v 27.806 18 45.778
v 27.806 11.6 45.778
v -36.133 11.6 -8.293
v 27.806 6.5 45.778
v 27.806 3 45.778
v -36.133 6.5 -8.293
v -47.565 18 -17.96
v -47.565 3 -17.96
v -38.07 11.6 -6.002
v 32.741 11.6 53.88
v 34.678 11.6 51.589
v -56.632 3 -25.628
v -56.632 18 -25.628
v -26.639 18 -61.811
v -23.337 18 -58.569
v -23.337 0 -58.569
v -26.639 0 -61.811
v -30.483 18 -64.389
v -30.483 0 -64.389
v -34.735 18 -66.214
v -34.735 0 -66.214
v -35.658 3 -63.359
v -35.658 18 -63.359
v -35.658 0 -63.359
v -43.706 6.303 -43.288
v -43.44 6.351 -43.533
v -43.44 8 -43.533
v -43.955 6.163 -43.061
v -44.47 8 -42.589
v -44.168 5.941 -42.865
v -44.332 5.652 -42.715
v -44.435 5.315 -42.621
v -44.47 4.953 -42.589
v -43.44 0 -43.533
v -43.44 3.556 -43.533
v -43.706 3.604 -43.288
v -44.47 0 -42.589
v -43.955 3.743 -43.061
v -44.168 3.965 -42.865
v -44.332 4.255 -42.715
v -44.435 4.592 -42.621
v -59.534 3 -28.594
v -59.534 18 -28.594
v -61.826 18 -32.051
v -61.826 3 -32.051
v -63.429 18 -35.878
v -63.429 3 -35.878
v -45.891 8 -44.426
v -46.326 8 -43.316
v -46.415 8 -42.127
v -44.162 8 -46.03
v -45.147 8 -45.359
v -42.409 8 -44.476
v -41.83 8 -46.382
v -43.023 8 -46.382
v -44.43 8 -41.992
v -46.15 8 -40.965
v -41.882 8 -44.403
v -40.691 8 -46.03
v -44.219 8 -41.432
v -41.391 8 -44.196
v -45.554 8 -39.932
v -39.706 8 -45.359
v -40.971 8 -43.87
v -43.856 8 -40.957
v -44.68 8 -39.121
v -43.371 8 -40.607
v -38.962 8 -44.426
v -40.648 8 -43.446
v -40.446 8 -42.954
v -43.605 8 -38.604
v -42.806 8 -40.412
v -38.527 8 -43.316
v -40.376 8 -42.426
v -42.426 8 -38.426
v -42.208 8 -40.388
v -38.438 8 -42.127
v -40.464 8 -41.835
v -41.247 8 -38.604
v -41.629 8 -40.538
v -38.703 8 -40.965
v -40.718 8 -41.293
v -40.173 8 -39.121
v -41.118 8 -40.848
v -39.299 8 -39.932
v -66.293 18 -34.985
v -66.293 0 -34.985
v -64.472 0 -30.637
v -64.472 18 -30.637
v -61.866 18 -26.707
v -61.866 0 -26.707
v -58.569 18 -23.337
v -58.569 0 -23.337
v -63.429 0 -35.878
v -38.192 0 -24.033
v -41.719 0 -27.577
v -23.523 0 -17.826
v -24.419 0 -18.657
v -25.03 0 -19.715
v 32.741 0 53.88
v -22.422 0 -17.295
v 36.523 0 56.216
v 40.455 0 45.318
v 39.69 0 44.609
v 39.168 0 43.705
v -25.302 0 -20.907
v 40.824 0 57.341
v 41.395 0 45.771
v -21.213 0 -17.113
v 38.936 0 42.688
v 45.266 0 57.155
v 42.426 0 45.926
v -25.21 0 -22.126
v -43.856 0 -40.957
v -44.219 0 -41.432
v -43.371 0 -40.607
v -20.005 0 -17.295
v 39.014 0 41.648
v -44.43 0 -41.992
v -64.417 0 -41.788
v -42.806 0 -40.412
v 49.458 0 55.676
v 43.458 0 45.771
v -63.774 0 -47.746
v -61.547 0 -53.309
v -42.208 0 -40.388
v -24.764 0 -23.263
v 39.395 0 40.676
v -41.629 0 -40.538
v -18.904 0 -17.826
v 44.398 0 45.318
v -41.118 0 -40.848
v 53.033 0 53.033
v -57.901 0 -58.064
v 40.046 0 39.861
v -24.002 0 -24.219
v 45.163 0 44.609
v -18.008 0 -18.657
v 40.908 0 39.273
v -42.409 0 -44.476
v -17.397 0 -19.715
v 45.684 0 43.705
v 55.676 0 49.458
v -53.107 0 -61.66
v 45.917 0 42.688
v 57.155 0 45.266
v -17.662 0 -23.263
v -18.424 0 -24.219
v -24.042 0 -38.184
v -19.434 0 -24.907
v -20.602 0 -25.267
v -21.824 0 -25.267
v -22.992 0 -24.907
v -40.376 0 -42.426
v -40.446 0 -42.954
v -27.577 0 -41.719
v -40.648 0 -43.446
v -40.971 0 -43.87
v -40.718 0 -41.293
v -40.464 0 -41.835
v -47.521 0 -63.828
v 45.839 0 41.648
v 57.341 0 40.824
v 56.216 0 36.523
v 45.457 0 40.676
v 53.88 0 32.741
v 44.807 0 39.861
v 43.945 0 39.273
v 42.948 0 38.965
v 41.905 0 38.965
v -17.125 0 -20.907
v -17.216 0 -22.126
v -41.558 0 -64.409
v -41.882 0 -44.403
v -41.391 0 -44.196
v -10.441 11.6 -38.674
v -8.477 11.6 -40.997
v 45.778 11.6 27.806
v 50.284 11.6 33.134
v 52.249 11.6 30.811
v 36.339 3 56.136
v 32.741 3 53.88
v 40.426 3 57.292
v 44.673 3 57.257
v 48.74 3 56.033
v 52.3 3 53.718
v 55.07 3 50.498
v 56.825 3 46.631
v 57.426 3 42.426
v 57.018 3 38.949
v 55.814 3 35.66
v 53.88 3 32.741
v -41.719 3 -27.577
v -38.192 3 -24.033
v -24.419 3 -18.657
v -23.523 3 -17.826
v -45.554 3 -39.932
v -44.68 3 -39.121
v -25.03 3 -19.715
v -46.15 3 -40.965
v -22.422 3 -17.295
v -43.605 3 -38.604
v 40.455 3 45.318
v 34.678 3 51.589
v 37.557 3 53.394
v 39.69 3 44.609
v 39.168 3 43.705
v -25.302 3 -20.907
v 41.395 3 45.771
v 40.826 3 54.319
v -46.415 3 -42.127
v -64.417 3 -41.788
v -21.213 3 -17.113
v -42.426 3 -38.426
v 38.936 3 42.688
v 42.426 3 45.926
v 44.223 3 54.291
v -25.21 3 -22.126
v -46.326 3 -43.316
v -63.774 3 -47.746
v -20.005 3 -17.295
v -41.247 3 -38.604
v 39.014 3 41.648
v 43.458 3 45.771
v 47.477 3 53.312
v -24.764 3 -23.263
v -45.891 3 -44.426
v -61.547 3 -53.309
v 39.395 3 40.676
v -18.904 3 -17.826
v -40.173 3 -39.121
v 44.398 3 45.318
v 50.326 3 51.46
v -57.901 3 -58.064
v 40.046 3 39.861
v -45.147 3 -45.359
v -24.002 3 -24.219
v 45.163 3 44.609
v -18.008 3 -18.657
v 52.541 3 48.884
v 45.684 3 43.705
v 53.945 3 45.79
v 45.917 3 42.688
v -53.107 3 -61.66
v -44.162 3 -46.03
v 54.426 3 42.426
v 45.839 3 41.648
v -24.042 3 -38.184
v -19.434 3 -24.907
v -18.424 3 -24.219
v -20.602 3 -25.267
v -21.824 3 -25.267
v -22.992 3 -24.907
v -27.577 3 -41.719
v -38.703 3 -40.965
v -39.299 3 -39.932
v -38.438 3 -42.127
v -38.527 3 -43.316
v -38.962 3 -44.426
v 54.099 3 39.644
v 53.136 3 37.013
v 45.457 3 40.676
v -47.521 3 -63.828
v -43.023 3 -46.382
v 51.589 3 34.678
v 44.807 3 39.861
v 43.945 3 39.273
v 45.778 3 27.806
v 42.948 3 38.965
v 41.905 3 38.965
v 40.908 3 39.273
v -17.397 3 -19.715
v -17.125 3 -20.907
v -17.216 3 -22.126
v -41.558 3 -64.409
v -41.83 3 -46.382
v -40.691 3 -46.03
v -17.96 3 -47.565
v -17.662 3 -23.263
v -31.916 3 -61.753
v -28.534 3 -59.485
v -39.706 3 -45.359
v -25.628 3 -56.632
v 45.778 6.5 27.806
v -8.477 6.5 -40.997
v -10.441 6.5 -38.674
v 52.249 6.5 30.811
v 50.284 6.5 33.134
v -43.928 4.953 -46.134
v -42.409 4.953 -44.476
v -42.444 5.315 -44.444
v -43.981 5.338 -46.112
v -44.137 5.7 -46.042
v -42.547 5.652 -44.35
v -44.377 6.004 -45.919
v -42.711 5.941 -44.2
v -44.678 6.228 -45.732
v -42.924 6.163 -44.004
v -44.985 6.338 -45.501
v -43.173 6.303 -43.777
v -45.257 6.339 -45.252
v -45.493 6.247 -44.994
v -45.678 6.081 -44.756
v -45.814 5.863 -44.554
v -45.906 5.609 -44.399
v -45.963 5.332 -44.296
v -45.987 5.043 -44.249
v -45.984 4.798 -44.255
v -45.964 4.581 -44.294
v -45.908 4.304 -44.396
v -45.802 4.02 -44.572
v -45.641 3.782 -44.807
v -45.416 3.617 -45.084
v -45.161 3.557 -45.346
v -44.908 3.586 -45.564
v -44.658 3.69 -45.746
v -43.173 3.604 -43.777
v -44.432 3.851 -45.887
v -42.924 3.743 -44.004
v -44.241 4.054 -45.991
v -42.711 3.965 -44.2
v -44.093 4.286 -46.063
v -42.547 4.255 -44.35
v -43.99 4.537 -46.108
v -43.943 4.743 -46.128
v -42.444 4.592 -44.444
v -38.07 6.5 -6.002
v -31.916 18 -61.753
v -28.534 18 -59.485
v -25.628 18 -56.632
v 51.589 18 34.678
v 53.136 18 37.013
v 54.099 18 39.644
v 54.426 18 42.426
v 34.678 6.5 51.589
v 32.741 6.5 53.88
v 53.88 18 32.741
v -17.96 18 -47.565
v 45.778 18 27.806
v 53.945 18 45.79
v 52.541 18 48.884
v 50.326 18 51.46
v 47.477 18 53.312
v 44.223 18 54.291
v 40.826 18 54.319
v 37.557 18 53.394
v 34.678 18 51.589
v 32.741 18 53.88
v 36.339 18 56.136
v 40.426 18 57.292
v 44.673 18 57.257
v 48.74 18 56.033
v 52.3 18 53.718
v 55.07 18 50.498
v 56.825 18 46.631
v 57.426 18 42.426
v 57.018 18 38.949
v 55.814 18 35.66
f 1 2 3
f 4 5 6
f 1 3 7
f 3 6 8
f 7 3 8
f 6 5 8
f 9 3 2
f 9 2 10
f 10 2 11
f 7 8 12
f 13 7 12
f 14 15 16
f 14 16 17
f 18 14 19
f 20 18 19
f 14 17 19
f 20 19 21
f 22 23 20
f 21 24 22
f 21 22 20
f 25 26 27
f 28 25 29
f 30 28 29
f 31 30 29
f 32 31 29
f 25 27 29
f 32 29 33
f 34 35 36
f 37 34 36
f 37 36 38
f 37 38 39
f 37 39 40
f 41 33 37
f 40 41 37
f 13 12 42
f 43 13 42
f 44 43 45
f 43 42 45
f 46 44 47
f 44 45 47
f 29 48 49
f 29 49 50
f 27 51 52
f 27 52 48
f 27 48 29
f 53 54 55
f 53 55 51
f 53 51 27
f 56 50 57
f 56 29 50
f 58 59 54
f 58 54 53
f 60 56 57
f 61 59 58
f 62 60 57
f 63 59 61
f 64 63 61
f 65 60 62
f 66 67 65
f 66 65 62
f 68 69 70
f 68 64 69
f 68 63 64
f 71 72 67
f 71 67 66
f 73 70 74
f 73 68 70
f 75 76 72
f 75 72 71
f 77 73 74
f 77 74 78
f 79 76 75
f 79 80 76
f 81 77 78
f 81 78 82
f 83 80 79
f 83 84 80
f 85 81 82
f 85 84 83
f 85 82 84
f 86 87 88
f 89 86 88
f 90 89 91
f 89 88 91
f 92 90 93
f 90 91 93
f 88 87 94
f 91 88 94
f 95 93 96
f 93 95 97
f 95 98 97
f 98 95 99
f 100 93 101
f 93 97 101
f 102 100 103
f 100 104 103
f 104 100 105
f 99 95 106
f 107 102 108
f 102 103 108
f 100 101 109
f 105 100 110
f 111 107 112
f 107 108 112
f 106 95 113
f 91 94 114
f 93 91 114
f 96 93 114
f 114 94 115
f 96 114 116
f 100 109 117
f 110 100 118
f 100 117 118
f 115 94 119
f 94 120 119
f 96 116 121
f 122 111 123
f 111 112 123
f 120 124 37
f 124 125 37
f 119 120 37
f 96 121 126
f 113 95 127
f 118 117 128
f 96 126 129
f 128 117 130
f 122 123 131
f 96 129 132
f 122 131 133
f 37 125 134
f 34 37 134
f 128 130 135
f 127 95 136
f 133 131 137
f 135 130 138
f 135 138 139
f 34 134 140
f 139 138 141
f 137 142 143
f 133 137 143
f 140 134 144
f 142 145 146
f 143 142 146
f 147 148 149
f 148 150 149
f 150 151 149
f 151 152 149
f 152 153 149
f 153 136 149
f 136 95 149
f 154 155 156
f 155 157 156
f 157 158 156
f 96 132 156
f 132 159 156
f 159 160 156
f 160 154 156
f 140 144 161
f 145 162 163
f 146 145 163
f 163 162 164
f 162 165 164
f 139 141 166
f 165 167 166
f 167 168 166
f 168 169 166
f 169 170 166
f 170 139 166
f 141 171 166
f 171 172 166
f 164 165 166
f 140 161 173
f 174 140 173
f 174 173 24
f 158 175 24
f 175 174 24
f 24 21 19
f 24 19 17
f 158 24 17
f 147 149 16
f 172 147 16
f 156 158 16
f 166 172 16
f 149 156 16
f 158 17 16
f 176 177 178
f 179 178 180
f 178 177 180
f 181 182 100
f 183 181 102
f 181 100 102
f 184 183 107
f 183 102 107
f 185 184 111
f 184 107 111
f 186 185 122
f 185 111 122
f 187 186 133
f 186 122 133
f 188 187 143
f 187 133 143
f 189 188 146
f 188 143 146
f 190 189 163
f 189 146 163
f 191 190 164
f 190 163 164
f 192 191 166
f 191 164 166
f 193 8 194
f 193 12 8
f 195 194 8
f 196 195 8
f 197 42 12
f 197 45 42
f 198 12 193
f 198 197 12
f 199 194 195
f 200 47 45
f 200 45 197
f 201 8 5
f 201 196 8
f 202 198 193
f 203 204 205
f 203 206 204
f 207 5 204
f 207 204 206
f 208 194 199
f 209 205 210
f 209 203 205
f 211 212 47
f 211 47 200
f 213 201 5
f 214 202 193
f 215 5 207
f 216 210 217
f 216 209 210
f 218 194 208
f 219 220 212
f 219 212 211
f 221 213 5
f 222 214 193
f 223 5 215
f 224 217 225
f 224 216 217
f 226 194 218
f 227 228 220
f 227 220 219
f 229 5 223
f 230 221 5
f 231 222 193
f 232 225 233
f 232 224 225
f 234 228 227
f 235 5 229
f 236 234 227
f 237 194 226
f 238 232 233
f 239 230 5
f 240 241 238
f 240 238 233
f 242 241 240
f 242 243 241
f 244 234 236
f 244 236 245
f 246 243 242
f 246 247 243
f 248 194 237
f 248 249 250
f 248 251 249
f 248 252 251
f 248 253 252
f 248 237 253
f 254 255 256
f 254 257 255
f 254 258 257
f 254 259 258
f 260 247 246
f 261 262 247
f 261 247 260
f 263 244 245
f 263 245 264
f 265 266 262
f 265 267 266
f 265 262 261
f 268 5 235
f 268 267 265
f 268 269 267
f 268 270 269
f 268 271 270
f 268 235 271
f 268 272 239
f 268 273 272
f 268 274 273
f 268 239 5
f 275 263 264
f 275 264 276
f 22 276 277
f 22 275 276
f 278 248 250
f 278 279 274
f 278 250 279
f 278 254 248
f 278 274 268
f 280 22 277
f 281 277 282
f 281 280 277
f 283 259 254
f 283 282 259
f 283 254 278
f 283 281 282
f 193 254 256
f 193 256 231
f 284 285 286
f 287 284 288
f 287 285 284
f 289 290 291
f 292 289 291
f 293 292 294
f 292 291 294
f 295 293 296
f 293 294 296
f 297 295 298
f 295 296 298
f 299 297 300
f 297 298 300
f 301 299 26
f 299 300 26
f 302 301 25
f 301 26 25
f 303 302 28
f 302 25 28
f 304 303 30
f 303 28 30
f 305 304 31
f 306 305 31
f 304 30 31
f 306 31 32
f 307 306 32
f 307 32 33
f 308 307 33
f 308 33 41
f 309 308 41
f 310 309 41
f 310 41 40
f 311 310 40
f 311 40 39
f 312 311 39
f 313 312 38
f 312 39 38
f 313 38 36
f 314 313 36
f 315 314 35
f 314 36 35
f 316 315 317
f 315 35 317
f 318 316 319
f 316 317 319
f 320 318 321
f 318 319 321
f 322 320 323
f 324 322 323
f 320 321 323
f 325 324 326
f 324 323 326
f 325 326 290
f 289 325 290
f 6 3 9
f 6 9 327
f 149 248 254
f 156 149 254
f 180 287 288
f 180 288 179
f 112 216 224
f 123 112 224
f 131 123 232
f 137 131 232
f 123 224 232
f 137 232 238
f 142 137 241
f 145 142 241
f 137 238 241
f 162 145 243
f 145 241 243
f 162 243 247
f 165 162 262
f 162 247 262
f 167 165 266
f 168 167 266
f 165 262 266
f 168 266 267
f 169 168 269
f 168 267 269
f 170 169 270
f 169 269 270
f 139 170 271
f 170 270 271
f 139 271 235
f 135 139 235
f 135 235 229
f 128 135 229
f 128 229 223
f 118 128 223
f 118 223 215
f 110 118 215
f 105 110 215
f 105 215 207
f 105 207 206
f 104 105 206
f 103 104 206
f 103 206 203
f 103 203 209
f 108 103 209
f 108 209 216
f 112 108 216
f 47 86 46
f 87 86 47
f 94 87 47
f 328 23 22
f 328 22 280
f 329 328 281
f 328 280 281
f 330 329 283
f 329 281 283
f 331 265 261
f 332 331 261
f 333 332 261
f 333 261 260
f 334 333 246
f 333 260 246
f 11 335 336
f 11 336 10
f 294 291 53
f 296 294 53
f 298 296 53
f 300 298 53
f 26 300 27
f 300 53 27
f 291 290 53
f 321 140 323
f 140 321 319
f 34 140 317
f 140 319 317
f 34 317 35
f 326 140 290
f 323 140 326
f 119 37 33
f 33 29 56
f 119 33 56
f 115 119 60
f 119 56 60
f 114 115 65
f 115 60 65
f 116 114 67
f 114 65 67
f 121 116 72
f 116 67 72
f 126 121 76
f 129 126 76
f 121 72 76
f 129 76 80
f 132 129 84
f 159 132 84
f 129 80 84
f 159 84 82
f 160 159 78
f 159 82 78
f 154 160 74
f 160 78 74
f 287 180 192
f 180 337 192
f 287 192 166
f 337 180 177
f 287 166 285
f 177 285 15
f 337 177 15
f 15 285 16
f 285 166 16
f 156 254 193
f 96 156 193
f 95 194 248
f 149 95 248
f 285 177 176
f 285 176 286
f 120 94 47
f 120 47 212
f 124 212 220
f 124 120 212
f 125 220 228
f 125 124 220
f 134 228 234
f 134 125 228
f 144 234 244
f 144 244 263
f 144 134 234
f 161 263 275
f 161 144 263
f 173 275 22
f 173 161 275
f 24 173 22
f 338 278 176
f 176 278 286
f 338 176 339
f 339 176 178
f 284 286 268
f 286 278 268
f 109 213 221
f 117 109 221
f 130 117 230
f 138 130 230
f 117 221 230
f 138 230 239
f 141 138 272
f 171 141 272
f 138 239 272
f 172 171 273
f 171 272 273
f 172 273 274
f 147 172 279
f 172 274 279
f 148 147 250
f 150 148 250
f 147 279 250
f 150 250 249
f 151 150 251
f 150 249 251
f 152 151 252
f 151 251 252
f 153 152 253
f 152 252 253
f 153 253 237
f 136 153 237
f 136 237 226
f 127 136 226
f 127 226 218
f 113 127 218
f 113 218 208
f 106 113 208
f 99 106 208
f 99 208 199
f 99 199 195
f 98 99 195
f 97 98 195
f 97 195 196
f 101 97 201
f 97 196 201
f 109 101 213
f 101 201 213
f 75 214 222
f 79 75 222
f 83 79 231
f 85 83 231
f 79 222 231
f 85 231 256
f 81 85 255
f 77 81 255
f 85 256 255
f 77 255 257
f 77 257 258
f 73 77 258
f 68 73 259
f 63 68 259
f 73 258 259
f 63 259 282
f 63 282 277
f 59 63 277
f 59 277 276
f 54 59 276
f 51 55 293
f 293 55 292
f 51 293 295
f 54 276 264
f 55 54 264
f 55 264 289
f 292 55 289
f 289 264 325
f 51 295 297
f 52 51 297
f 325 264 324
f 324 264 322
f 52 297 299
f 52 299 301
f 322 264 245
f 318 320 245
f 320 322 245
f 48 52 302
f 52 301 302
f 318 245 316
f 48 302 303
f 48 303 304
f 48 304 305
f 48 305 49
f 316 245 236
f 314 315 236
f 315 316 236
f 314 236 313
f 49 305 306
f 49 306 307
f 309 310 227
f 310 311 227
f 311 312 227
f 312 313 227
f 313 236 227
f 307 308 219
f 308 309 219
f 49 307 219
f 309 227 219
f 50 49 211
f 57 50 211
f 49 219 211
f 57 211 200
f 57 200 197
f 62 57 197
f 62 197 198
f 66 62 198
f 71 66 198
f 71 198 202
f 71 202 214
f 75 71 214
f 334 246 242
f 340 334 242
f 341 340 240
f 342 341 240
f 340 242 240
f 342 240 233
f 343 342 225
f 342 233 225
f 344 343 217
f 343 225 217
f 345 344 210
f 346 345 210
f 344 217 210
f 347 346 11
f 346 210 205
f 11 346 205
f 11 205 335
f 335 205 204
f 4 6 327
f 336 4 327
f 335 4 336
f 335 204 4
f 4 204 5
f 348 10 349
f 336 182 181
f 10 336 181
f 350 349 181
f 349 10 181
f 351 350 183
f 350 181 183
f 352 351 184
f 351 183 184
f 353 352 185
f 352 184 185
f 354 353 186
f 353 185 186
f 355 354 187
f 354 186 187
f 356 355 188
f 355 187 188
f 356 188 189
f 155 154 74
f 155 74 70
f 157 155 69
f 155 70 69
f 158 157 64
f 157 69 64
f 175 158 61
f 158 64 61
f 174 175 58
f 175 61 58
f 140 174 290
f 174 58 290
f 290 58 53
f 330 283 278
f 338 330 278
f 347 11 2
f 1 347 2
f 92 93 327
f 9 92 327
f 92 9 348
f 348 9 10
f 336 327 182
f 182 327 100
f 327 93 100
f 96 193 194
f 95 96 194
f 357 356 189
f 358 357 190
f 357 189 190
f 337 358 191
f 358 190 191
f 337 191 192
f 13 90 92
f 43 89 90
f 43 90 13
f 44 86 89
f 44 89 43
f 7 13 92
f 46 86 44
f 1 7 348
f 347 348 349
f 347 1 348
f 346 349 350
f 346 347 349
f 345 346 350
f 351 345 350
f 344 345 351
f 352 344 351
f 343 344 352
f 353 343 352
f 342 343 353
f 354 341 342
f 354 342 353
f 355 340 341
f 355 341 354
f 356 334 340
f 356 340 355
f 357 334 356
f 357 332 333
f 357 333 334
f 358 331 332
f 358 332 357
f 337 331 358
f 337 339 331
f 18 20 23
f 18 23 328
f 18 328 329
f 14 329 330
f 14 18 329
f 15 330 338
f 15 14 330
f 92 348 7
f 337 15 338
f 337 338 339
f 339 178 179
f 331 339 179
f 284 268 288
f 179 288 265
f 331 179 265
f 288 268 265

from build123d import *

# Parameters (mm, degrees)
EXTRUDE_2_DEPTH           = 3
SKETCH_4_R                = 2.25
SKETCH_4_R_2              = 2.5
CUT_EXTRUDE_2_DEPTH       = 96.402519291
SKETCH_6_R                = 3.5
CUT_EXTRUDE_3_DEPTH       = 96.402519291
SKETCH_7_R                = 3.5
CUT_EXTRUDE_4_DEPTH       = 96.402519291
CUT_EXTRUDE_5_DEPTH       = 96.402519291
EXTRUDE_4_DEPTH           = 15
EXTRUDE_5_DEPTH           = 3
SKETCH_11_R               = 4.1
CUT_EXTRUDE_6_DEPTH       = 3
SKETCH_13_R               = 3.5
EXTRUDE_6_DEPTH           = 3
SKETCH_14_R               = 2.05
EXTRUDE_7_DEPTH           = 5
EXTRUDE_START             = -5
SKETCH_15_R               = 4
SKETCH_15_R_2             = 2.05
EXTRUDE_8_DEPTH           = 5
CUT_EXTRUDE_7_DEPTH       = 96.878259721
SKETCH_18_R               = 1.397318861
CUT_EXTRUDE_8_DEPTH       = 144.753442506
CUT_EXTRUDE_9_DEPTH       = 97.527927136
CUT_EXTRUDE_9_DEPTH_BACK  = 97.527927136
CUT_EXTRUDE_11_DEPTH      = 110.140706759
CUT_EXTRUDE_11_DEPTH_BACK = 110.140706759
SKETCH_20_W               = 92.736362136
SKETCH_20_H               = 2.6
SKETCH_20_H_2             = 2.5
CUT_EXTRUDE_12_DEPTH      = 5


with BuildPart() as part:
    # 草图2 → 凸台-拉伸2 (new body)
    with BuildSketch(Plane(origin=(0, 0, 0), x_dir=(1, 0, 0), z_dir=(0, 1, 0))):
        with BuildLine():
            Line((-58.569449541, 23.337085947), (32.740581269, -53.879999426))
            ThreePointArc((32.740581269, -53.879999426), (53.033008589, -53.033008589), (53.879999426, -32.740581269))
            Line((53.879999426, -32.740581269), (-23.337085947, 58.569449541))
            ThreePointArc((-23.337085947, 58.569449541), (-60.104076401, 60.104076401), (-58.569449541, 23.337085947))
        make_face()
    extrude(amount=EXTRUDE_2_DEPTH)

    # 草图4 → 切除-拉伸2 (cut, through all)
    with BuildSketch(Plane(origin=(0, 3, 0), x_dir=(1, 0, 0), z_dir=(0, 1, 0))):
        with Locations(Location((-42.426406871, 42.426406871, 0), (0, 0, 270))):
            Circle(SKETCH_4_R)
        with Locations(Location((42.426406871, -42.426406871, 0), (0, 0, 270))):
            Circle(SKETCH_4_R_2)
    extrude(amount=-CUT_EXTRUDE_2_DEPTH, mode=Mode.SUBTRACT)

    # 草图6 → 切除-拉伸3 (cut, through all)
    with BuildSketch(Plane(origin=(0, 3, 0), x_dir=(1, 0, 0), z_dir=(0, 1, 0))):
        with Locations(Location((-42.426406871, 42.426406871, 0), (0, 0, 270))):
            Circle(SKETCH_6_R)
    extrude(amount=-CUT_EXTRUDE_3_DEPTH, mode=Mode.SUBTRACT)

    # 草图7 → 切除-拉伸4 (cut, through all)
    with BuildSketch(Plane(origin=(0, 3, 0), x_dir=(1, 0, 0), z_dir=(0, 1, 0))):
        with Locations(Location((42.426406871, -42.426406871, 0), (0, 0, 270))):
            Circle(SKETCH_7_R)
    extrude(amount=-CUT_EXTRUDE_4_DEPTH, mode=Mode.SUBTRACT)

    # 草图8 → 切除-拉伸5 (cut, through all)
    with BuildSketch(Plane(origin=(0, 3, 0), x_dir=(1, 0, 0), z_dir=(0, 1, 0))):
        Polygon((33.626672858, -22.564710472), (-15.702999665, 25.870376375), (-26.891422763, 12.98046534), (25.218843822, -32.251166492), align=None)
    extrude(amount=-CUT_EXTRUDE_5_DEPTH, mode=Mode.SUBTRACT)

    # 草图9 → 凸台-拉伸4 (add)
    with BuildSketch(Plane(origin=(0, 3, 0), x_dir=(1, 0, 0), z_dir=(0, 1, 0))):
        with BuildLine():
            ThreePointArc((-17.960284018, 47.565359346), (-19.96440182, 53.401757848), (-23.337085947, 58.569449541))
            ThreePointArc((-23.337085947, 58.569449541), (-60.104076401, 60.104076401), (-58.569449541, 23.337085947))
            ThreePointArc((-58.569449541, 23.337085947), (-53.401757848, 19.96440182), (-47.565359346, 17.960284018))
            Line((-47.565359346, 17.960284018), (-56.632284421, 25.627804458))
            ThreePointArc((-56.632284421, 25.627804458), (-57.982756057, 57.982756057), (-25.627804458, 56.632284421))
            Line((-25.627804458, 56.632284421), (-17.960284018, 47.565359346))
        make_face()
        with BuildLine():
            Line((53.879999426, -32.740581269), (-23.337085947, 58.569449541))
            ThreePointArc((-23.337085947, 58.569449541), (-19.96440182, 53.401757848), (-17.960284018, 47.565359346))
            Line((-17.960284018, 47.565359346), (45.777785554, -27.805590857))
            ThreePointArc((45.777785554, -27.805590857), (50.229311839, -29.615681908), (53.879999426, -32.740581269))
        make_face()
        with BuildLine():
            ThreePointArc((-47.565359346, 17.960284018), (-53.401757848, 19.96440182), (-58.569449541, 23.337085947))
            Line((-58.569449541, 23.337085947), (32.740581269, -53.879999426))
            ThreePointArc((32.740581269, -53.879999426), (29.615681908, -50.229311839), (27.805590857, -45.777785554))
            Line((27.805590857, -45.777785554), (-47.565359346, 17.960284018))
        make_face()
        with BuildLine():
            ThreePointArc((57.426406871, -42.426406871), (56.511929373, -37.26907657), (53.879999426, -32.740581269))
            ThreePointArc((53.879999426, -32.740581269), (50.229311839, -29.615681908), (45.777785554, -27.805590857))
            Line((45.777785554, -27.805590857), (51.589280915, -34.67774639))
            ThreePointArc((51.589280915, -34.67774639), (53.694824873, -38.30054263), (54.426406871, -42.426406871))
            ThreePointArc((54.426406871, -42.426406871), (47.47695507, -53.311808237), (34.67774639, -51.589280915))
            Line((34.67774639, -51.589280915), (27.805590857, -45.777785554))
            ThreePointArc((27.805590857, -45.777785554), (29.615681908, -50.229311839), (32.740581269, -53.879999426))
            ThreePointArc((32.740581269, -53.879999426), (48.73959212, -56.033158578), (57.426406871, -42.426406871))
        make_face()
    extrude(amount=EXTRUDE_4_DEPTH)

    # 草图10 → 凸台-拉伸5 (add)
    with BuildSketch(Plane(origin=(0, 3, 0), x_dir=(1, 0, 0), z_dir=(0, 1, 0))):
        Polygon((10.528753113, -10.528753113), (-20.427450775, 20.427450775), (-26.891422763, 12.98046534), (25.218843822, -32.251166492), (28.486536718, -28.486536718), align=None)
        Polygon((-15.702999665, 25.870376375), (-20.427450775, 20.427450775), (10.528753113, -10.528753113), (28.486536718, -28.486536718), (33.626672858, -22.564710472), align=None)
    extrude(amount=-EXTRUDE_5_DEPTH)

    # 草图11 → 切除-拉伸6 (cut)
    with BuildSketch(Plane(origin=(0, 3, 0), x_dir=(1, 0, 0), z_dir=(0, 1, 0))):
        with Locations(Location((-21.213203436, 21.213203436, 0), (0, 0, 270))):
            Circle(SKETCH_11_R)
    extrude(amount=-CUT_EXTRUDE_6_DEPTH, mode=Mode.SUBTRACT)

    # 草图13 → 凸台-拉伸6 (add)
    with BuildSketch(Plane(origin=(0, 3, 0), x_dir=(1, 0, 0), z_dir=(0, 1, 0))):
        with Locations((-42.426406871, 42.426406871)):
            Circle(SKETCH_13_R)
    extrude(amount=-EXTRUDE_6_DEPTH)

    # 草图14 → 凸台-拉伸7 (add)
    with BuildSketch(Plane(origin=(0, 3, 0), x_dir=(1, 0, 0), z_dir=(0, 1, 0))):
        with Locations(Location((-42.426406871, 42.426406871, 0), (0, 0, 270))):
            Circle(SKETCH_14_R)
    extrude(amount=EXTRUDE_7_DEPTH)

    # 草图15 → 凸台-拉伸8 (add)
    with BuildSketch(Plane(origin=(0, 8, 0), x_dir=(1, 0, 0), z_dir=(0, 1, 0)).offset(EXTRUDE_START)):
        with Locations(Location((-42.426406871, 42.426406871, 0), (0, 0, 270))):
            Circle(SKETCH_15_R)
        with Locations((-42.426406871, 42.426406871)):
            Circle(SKETCH_15_R_2, mode=Mode.SUBTRACT)
    extrude(amount=EXTRUDE_8_DEPTH)

    # 草图17 → 切除-拉伸7 (cut, through all)
    with BuildSketch(Plane(origin=(0, 8, 0), x_dir=(1, 0, 0), z_dir=(0, 1, 0))):
        with BuildLine():
            Line((-42.409215342, 44.476334785), (-43.439595085, 43.532503451))
            Line((-43.439595085, 43.532503451), (-44.469974827, 42.588672118))
            ThreePointArc((-44.469974827, 42.588672118), (-42.507603209, 40.378015513), (-40.376406871, 42.426406871))
            ThreePointArc((-40.376406871, 42.426406871), (-40.970772536, 43.869884853), (-42.409215342, 44.476334785))
        make_face()
    extrude(amount=-CUT_EXTRUDE_7_DEPTH, mode=Mode.SUBTRACT)

    # 草图18 → 切除-拉伸8 (cut, through all)
    with BuildSketch(Plane(origin=(-41.501827845, 0, -45.307504805), x_dir=(0.7373977200215518, 0, -0.6754588088899406), z_dir=(0.6754588088899406, 0, 0.7373977200215518))):
        with Locations((-2.627845445, 4.953208644)):
            Circle(SKETCH_18_R)
    extrude(amount=-CUT_EXTRUDE_8_DEPTH, mode=Mode.SUBTRACT)

    # 草图19 → 切除-拉伸9 (cut, two sides: drawn at the far end of the back side and taken through both)
    with BuildSketch(Plane(origin=(0, 3, 0), x_dir=(1, 0, 0), z_dir=(0, 1, 0)).offset(-CUT_EXTRUDE_9_DEPTH_BACK)):
        with BuildLine():
            Line((-66.29326799, 34.985107232), (-63.429244656, 35.878063189))
            ThreePointArc((-63.429244656, 35.878063189), (-57.900931168, 58.064152802), (-35.65805893, 63.35938244))
            Line((-35.65805893, 63.35938244), (-34.735102393, 66.213879108))
            ThreePointArc((-34.735102393, 66.213879108), (-60.011093572, 60.196572701), (-66.29326799, 34.985107232))
        make_face()
    extrude(amount=CUT_EXTRUDE_9_DEPTH + CUT_EXTRUDE_9_DEPTH_BACK, mode=Mode.SUBTRACT)

    # 草图20 → 切除-拉伸11 (cut, two sides: drawn at the far end of the back side and taken through both)
    with BuildSketch(Plane(origin=(-12.914434136, 0, 15.27145674), x_dir=(0.7635728369858691, 0, 0.6457217067881111), z_dir=(-0.6457217067881111, 0, 0.7635728369858691)).offset(-CUT_EXTRUDE_11_DEPTH_BACK)):
        with Locations((13.423122648, 10.3)):
            Rectangle(SKETCH_20_W, SKETCH_20_H)
        with Locations((13.423122648, 7.75)):
            Rectangle(SKETCH_20_W, SKETCH_20_H_2)
    extrude(amount=CUT_EXTRUDE_11_DEPTH + CUT_EXTRUDE_11_DEPTH_BACK, mode=Mode.SUBTRACT)

    # 草图23 → 切除-拉伸12 (cut)
    with BuildSketch(Plane(origin=(0, 3, 0), x_dir=(1, 0, 0), z_dir=(0, 1, 0))):
        Polygon((-34.648232278, 34.648232278), (-31.112698372, 31.112698372), (-24.04163056, 38.183766184), (-27.577164466, 41.71930009), align=None)
        Polygon((-38.192264962, 24.033131782), (-31.112698372, 31.112698372), (-34.648232278, 34.648232278), (-41.71930009, 27.577164466), align=None)
    extrude(amount=-CUT_EXTRUDE_12_DEPTH, mode=Mode.SUBTRACT)


solid = part.part
